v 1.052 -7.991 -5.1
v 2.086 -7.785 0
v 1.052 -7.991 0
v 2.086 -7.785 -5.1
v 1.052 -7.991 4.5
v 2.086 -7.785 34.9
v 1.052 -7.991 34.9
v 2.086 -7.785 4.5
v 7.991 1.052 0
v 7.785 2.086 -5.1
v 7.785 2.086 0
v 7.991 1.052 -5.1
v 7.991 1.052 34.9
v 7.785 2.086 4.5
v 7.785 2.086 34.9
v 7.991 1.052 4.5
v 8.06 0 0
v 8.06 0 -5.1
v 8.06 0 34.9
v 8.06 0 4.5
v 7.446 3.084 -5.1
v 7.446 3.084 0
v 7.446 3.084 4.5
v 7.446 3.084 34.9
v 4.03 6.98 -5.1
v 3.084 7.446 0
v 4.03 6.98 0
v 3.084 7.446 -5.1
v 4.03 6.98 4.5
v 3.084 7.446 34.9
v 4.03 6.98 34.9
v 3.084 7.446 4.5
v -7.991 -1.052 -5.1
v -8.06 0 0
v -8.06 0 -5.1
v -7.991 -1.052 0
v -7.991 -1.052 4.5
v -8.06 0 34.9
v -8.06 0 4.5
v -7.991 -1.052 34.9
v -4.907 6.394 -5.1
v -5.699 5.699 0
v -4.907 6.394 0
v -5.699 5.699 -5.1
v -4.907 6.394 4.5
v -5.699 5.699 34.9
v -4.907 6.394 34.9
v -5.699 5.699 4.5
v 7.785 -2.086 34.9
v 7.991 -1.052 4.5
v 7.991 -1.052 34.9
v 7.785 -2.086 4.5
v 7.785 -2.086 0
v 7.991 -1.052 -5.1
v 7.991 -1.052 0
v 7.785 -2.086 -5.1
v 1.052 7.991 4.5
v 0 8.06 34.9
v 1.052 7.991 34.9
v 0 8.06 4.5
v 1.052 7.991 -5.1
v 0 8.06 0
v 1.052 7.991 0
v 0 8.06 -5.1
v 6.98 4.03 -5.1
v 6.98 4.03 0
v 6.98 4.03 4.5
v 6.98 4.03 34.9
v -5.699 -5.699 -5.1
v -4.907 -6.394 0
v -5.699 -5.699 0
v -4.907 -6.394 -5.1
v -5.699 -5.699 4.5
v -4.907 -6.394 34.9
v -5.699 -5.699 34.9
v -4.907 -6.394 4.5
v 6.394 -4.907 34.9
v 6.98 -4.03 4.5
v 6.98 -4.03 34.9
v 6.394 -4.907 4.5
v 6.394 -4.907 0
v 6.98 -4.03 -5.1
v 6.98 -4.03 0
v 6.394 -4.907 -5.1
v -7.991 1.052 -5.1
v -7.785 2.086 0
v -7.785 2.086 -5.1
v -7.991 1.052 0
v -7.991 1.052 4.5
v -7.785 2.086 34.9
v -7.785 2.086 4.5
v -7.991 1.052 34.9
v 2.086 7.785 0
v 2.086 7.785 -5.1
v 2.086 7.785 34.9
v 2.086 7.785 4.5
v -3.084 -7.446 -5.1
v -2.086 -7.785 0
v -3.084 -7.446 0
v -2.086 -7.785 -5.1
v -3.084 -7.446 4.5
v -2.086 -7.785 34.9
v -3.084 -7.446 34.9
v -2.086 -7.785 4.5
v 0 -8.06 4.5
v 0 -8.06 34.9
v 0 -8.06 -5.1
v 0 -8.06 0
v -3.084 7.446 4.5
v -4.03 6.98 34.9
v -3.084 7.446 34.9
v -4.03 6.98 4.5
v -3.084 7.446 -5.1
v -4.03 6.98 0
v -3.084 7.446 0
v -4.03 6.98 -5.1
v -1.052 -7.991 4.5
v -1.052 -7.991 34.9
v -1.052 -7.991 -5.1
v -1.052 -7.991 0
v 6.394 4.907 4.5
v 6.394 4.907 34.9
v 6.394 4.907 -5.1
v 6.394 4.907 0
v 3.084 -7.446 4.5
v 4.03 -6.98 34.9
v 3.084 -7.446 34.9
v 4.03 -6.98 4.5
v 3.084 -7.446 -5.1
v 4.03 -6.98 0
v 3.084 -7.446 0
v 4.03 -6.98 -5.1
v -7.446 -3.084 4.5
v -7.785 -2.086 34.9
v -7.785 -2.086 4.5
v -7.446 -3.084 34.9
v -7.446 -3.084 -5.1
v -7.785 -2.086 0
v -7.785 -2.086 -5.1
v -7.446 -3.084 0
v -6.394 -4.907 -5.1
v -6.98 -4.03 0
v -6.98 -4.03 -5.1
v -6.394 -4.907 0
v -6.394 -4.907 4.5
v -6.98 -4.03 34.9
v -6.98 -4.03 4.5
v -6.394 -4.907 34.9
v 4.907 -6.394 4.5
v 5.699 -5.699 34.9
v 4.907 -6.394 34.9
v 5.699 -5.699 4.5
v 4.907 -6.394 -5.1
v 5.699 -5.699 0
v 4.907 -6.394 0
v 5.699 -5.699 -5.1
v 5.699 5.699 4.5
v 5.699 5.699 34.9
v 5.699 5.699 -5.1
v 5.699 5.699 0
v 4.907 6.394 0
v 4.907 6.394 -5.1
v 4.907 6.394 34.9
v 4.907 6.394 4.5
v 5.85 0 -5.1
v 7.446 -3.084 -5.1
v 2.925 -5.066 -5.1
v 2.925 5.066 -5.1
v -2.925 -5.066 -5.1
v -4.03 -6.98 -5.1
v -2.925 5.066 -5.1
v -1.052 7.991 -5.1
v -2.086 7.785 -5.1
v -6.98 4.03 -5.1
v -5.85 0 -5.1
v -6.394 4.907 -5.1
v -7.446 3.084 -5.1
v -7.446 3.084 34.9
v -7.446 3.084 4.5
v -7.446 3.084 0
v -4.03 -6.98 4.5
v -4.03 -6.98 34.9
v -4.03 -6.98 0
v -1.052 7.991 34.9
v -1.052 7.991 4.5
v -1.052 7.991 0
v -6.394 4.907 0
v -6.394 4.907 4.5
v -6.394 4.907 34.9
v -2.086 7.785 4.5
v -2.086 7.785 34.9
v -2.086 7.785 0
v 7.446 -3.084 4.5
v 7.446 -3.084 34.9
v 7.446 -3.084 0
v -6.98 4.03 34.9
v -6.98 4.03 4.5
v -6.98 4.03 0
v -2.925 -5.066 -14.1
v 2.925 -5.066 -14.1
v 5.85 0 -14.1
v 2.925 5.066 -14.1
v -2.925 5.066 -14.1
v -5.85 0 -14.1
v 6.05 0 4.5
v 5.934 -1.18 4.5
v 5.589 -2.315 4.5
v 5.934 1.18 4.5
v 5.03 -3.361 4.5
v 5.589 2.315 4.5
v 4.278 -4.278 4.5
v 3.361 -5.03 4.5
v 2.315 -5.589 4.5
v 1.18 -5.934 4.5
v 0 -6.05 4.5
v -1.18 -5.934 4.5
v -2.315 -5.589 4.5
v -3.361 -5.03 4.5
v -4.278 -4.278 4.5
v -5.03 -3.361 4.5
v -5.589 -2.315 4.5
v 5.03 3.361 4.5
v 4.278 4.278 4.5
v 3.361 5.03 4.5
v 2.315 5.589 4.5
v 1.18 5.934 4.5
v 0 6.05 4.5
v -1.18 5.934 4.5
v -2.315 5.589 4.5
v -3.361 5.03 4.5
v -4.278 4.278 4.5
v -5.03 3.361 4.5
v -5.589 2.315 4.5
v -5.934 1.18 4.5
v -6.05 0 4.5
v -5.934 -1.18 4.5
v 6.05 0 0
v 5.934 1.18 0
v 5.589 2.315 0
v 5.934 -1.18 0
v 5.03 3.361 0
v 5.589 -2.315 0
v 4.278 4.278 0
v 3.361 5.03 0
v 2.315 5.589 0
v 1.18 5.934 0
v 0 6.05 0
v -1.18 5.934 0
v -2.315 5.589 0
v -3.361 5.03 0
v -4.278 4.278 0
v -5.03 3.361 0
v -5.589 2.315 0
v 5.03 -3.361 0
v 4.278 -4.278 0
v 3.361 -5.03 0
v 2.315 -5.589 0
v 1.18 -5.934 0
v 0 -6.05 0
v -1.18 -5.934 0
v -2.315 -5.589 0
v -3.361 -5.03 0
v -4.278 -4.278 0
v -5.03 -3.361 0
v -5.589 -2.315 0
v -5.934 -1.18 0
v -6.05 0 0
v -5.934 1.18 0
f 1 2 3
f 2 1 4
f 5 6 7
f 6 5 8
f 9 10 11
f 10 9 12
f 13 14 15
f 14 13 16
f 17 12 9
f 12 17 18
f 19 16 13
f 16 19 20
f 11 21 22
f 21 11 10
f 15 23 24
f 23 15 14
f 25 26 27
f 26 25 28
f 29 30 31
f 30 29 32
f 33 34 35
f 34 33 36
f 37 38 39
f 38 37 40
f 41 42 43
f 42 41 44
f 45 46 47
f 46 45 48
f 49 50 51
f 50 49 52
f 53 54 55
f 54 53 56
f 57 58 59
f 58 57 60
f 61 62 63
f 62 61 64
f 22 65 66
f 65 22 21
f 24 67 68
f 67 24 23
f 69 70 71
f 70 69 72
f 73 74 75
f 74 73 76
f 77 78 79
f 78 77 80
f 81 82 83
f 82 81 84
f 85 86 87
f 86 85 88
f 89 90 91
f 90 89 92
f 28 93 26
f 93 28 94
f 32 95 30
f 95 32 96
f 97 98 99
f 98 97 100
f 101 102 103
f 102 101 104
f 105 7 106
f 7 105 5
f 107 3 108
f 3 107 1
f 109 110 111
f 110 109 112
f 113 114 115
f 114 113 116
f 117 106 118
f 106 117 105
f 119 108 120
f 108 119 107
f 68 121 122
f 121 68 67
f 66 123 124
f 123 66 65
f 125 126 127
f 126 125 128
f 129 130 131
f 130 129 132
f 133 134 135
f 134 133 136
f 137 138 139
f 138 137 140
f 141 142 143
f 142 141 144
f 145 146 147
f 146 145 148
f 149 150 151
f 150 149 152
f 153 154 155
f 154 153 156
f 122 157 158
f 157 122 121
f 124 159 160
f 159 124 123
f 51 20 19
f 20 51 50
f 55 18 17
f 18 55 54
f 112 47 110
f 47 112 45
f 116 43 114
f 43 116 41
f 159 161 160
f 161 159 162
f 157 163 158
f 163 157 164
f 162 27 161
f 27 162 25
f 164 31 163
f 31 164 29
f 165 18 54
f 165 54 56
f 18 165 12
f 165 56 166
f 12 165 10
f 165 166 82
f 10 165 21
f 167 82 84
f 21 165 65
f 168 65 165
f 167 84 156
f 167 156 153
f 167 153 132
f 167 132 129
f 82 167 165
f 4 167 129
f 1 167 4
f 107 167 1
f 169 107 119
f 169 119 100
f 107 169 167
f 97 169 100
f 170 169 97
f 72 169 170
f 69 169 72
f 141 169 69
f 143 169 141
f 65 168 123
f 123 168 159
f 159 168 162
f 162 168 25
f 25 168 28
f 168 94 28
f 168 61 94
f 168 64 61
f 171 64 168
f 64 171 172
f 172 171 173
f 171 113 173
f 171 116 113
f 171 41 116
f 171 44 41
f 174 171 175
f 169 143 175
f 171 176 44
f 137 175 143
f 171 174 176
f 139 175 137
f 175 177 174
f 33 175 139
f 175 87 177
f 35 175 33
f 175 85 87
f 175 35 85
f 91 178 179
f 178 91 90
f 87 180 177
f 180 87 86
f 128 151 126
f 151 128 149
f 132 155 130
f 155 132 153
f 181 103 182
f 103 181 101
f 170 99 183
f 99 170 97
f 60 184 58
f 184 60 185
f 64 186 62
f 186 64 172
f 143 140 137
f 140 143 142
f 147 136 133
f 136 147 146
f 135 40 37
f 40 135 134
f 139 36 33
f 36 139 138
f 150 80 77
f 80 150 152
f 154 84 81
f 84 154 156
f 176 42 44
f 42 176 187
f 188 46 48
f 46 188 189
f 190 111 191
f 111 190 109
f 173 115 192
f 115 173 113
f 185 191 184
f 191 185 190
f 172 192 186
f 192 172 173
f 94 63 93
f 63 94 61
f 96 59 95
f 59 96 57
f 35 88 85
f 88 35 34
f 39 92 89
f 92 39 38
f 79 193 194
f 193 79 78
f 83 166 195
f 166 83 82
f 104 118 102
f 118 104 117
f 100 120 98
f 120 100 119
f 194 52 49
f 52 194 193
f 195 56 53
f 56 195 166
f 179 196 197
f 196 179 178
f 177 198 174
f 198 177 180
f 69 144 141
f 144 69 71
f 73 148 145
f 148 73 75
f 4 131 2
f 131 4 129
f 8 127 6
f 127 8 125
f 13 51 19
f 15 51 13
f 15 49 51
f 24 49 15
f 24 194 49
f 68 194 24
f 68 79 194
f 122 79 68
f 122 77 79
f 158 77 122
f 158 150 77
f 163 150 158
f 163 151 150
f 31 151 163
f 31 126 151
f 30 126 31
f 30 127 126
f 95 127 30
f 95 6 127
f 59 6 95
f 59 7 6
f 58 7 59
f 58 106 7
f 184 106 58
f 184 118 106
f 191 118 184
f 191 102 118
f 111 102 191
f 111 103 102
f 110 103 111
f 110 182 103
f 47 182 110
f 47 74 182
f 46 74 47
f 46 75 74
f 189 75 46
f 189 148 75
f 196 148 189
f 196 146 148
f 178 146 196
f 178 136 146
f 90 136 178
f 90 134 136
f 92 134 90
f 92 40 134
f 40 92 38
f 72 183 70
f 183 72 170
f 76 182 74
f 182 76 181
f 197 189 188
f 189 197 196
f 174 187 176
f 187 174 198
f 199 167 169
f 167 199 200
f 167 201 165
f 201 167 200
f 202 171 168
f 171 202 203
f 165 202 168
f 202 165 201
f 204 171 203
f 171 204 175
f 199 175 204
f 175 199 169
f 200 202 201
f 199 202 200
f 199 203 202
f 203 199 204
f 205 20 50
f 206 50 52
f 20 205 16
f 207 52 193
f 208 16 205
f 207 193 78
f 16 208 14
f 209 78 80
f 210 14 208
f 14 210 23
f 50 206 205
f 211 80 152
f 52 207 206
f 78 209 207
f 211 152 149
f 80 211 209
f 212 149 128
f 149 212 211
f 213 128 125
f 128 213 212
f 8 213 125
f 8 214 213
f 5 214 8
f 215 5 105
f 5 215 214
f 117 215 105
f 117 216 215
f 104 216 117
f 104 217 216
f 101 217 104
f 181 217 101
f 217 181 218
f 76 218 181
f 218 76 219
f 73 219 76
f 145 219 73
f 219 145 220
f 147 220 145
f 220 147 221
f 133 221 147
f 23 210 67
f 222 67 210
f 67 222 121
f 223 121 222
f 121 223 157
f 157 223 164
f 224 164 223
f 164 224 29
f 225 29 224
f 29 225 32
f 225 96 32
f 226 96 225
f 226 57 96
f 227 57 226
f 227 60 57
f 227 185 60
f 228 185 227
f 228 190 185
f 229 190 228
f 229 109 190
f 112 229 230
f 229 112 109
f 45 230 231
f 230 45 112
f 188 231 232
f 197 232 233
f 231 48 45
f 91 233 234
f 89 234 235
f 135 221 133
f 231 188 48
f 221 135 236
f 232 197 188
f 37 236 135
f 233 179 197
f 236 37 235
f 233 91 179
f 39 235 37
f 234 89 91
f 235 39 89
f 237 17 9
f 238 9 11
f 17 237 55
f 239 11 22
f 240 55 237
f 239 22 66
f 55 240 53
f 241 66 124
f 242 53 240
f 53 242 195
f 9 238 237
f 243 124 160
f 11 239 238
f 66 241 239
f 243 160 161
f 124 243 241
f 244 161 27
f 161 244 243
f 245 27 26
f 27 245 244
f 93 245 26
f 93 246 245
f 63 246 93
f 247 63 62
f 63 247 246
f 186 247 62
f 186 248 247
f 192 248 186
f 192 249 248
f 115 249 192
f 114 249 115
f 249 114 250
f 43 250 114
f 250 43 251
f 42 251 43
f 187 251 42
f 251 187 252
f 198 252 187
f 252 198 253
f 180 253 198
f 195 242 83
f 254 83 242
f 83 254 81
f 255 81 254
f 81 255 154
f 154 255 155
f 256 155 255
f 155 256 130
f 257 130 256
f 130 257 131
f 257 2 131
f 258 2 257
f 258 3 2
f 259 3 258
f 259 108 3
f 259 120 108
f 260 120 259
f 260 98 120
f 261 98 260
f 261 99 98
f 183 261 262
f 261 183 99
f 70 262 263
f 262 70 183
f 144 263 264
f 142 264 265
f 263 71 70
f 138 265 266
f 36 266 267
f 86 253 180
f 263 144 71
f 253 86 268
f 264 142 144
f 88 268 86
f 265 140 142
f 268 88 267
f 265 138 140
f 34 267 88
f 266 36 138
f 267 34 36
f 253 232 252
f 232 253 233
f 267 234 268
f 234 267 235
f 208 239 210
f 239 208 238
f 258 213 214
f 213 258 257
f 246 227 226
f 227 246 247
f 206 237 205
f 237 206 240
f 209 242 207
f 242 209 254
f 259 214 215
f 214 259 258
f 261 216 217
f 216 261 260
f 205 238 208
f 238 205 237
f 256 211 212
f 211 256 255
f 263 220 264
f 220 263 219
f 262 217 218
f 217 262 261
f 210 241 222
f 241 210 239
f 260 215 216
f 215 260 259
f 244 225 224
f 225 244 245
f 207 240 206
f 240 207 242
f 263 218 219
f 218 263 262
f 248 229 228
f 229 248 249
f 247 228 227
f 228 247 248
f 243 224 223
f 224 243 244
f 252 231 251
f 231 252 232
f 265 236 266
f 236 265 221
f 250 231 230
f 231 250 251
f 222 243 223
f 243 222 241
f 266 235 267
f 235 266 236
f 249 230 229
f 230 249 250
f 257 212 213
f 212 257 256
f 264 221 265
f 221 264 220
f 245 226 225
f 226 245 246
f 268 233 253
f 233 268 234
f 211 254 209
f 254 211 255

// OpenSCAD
module grooveRing(spread) {
radGroove = 12.1/2;
widthGroove = 4.5;
  #difference() {
    cylinder(h=widthGroove+1.6*spread+1*0,r=10,$fn=24);
    translate([0,0,-.1]) cylinder(h=6,r=radGroove+spread*0.6,$fn=32);
  }
}

module ChineseHotEnd() {
spread = 0.2*0;
radCyl = 16.12/2;
widthCap = 5.1;
heightNut = 8.5;
diamNut = 10;
radNutEdges = 11.7/2;  // tips of hexagons used for $fn=6 cyl, not face diam
  difference() {
    union() {
      translate([0,0,-widthCap-spread]) {
        cylinder(h=40+spread,r=radCyl+spread,$fn=48);
        translate([0,0,-heightNut-.5]) cylinder(h=9.9,r=radNutEdges+1.0*spread,$fn=6);
      }

    }
    translate([0,0,spread]) grooveRing(spread);
  }
}

ChineseHotEnd();
